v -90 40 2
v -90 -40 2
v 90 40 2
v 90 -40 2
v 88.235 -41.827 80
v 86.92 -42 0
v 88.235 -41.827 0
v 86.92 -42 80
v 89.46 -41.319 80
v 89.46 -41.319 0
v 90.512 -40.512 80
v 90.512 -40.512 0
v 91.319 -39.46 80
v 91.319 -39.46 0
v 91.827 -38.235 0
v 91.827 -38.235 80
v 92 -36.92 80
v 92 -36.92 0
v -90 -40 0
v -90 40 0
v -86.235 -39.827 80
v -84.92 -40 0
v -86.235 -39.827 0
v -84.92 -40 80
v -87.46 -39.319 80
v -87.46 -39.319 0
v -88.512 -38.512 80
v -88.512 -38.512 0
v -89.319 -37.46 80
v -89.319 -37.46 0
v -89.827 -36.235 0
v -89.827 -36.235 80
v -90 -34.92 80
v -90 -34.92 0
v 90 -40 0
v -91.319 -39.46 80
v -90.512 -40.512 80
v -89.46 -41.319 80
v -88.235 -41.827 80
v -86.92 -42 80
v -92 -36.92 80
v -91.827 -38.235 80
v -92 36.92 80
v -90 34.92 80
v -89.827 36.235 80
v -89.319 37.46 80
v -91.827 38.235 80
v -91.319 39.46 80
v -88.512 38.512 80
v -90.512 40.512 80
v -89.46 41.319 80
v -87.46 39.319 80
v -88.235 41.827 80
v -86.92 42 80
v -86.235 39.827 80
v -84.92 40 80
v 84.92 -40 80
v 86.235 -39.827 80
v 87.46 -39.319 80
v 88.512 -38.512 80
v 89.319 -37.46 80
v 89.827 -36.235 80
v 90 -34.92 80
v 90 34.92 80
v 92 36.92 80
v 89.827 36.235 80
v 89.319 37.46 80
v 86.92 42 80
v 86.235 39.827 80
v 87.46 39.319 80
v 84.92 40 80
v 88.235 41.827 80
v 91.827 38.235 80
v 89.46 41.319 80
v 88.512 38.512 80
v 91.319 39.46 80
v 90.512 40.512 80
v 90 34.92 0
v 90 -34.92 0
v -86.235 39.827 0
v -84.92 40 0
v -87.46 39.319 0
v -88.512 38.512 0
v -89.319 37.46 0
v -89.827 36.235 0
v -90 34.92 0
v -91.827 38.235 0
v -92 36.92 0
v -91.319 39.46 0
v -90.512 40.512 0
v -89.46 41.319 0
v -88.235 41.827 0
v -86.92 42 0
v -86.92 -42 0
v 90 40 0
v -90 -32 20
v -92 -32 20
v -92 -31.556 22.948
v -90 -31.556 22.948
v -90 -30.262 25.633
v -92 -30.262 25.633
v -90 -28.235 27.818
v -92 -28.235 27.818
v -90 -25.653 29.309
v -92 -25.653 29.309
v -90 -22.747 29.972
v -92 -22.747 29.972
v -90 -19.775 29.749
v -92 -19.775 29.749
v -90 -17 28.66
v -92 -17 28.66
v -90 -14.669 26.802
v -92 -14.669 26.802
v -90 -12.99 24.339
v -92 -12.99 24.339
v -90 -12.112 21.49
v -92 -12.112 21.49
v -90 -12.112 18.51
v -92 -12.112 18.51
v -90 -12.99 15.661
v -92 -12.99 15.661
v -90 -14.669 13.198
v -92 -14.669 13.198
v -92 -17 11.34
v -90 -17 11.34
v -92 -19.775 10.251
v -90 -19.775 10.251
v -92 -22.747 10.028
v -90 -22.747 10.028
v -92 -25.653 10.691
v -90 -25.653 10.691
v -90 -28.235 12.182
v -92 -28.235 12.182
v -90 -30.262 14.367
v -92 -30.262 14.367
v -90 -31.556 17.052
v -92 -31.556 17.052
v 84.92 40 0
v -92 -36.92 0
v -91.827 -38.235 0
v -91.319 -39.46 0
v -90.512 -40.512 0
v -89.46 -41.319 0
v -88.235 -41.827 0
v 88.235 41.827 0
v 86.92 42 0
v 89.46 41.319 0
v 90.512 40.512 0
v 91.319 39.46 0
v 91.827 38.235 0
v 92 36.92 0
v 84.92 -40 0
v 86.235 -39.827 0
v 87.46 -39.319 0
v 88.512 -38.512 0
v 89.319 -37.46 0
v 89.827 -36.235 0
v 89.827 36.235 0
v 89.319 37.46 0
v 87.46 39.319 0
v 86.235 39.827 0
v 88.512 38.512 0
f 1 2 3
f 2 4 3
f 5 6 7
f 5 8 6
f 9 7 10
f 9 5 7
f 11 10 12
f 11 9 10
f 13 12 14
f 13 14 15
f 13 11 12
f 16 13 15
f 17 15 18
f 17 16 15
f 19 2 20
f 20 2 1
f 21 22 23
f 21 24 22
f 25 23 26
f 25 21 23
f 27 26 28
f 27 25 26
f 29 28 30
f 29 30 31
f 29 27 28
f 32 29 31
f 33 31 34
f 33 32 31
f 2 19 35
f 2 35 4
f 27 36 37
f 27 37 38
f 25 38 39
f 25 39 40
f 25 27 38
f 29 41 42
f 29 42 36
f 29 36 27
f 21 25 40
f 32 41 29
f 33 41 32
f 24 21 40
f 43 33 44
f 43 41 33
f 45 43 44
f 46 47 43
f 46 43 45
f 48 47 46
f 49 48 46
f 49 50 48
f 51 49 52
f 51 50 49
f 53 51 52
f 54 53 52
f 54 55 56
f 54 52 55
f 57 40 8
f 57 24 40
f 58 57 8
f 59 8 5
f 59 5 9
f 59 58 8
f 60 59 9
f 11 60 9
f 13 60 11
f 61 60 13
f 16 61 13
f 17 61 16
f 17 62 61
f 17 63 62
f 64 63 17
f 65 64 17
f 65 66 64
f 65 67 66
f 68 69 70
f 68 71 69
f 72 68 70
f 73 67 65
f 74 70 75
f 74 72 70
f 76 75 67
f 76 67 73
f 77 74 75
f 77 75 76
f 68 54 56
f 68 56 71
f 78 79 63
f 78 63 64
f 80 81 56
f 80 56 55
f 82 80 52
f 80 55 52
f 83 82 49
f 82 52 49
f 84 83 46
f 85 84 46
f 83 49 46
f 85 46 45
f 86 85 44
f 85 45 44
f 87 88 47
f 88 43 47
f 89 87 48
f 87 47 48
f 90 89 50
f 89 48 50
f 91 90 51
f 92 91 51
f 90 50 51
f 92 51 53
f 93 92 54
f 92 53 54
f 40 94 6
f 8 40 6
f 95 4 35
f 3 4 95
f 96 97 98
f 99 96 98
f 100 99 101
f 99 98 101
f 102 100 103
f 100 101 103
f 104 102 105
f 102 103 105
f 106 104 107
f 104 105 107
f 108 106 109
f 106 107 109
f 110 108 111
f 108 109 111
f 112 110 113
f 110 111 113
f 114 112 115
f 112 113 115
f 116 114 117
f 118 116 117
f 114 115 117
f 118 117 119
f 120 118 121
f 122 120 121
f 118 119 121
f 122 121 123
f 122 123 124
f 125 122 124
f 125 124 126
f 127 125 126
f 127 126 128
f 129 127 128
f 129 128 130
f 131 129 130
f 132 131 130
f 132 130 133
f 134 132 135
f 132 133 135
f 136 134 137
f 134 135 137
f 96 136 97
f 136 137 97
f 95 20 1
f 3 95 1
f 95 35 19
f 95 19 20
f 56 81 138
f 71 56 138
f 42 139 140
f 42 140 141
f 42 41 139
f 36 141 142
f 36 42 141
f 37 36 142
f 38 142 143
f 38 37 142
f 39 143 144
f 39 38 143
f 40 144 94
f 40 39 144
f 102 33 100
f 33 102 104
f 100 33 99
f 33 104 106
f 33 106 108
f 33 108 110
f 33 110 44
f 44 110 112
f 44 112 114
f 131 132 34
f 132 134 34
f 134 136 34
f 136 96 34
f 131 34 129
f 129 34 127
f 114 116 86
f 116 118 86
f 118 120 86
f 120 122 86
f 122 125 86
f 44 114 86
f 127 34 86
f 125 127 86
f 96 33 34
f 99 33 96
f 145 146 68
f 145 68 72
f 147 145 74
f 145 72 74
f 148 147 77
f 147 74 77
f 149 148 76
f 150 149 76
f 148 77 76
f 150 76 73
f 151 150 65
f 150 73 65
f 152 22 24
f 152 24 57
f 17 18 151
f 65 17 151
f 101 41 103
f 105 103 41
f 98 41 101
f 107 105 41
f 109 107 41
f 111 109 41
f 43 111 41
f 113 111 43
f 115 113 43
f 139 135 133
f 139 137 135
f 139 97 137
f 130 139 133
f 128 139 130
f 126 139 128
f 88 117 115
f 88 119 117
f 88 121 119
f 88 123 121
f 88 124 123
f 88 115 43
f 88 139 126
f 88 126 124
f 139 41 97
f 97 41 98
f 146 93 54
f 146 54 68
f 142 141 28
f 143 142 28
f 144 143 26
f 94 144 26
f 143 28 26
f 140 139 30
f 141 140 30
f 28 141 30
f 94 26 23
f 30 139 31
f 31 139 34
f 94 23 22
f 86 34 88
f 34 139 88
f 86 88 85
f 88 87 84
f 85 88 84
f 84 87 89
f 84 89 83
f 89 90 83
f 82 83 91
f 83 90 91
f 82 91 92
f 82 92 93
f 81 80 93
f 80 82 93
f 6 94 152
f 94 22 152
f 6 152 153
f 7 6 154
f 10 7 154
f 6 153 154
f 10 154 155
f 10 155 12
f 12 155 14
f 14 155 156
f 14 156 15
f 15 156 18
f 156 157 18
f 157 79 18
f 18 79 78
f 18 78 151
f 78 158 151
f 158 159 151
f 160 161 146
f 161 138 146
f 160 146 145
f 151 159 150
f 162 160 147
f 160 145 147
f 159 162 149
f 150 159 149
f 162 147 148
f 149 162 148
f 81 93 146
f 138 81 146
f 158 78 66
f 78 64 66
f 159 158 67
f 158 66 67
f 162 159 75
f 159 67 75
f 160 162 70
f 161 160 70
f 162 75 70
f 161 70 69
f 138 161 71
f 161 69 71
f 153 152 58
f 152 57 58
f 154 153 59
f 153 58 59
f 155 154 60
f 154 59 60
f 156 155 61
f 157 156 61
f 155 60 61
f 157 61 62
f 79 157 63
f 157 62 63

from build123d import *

# Parameters (mm, degrees)
F0_W     = 184
F0_H     = 84
F0_W_2   = 180
F0_H_2   = 80
F1_DEPTH = 80
F2_W     = 80
F2_H     = 2
F3_DEPTH = 90
F4_R     = 10
F5_DEPTH = 2
F6_R     = 5.08


with BuildPart() as f1:
    # F0 (on Top) → F1 (new body)
    with BuildSketch(Plane.XY):
        Rectangle(F0_W, F0_H)
        Rectangle(F0_W_2, F0_H_2, mode=Mode.SUBTRACT)
    extrude(amount=F1_DEPTH)

    # F4 (on face) → F5 (cut)
    with BuildSketch(Plane(origin=(-92, 0, 0), x_dir=(0, -1, 0), z_dir=(-1, 0, 0))):
        with Locations((22, 20)):
            Circle(F4_R)
    extrude(amount=-F5_DEPTH, mode=Mode.SUBTRACT)

    # F6
    f6_edges = [f1.edges().sort_by_distance(p)[0] for p in [
        (-92, -42, 40),
        (-90, -40, 40),
        (-92, 42, 40),
        (-90, 40, 40),
        (90, 40, 40),
        (92, 42, 40),
        (92, -42, 40),
        (90, -40, 40),
    ]]
    fillet(f6_edges, radius=F6_R)


with BuildPart() as f3:
    # F2 (on Right) → F3 (new body, symmetric)
    with BuildSketch(Plane.YZ):
        with Locations((0, 1)):
            Rectangle(F2_W, F2_H)
    extrude(amount=F3_DEPTH, both=True)


solid = Compound([f1.part, f3.part])
